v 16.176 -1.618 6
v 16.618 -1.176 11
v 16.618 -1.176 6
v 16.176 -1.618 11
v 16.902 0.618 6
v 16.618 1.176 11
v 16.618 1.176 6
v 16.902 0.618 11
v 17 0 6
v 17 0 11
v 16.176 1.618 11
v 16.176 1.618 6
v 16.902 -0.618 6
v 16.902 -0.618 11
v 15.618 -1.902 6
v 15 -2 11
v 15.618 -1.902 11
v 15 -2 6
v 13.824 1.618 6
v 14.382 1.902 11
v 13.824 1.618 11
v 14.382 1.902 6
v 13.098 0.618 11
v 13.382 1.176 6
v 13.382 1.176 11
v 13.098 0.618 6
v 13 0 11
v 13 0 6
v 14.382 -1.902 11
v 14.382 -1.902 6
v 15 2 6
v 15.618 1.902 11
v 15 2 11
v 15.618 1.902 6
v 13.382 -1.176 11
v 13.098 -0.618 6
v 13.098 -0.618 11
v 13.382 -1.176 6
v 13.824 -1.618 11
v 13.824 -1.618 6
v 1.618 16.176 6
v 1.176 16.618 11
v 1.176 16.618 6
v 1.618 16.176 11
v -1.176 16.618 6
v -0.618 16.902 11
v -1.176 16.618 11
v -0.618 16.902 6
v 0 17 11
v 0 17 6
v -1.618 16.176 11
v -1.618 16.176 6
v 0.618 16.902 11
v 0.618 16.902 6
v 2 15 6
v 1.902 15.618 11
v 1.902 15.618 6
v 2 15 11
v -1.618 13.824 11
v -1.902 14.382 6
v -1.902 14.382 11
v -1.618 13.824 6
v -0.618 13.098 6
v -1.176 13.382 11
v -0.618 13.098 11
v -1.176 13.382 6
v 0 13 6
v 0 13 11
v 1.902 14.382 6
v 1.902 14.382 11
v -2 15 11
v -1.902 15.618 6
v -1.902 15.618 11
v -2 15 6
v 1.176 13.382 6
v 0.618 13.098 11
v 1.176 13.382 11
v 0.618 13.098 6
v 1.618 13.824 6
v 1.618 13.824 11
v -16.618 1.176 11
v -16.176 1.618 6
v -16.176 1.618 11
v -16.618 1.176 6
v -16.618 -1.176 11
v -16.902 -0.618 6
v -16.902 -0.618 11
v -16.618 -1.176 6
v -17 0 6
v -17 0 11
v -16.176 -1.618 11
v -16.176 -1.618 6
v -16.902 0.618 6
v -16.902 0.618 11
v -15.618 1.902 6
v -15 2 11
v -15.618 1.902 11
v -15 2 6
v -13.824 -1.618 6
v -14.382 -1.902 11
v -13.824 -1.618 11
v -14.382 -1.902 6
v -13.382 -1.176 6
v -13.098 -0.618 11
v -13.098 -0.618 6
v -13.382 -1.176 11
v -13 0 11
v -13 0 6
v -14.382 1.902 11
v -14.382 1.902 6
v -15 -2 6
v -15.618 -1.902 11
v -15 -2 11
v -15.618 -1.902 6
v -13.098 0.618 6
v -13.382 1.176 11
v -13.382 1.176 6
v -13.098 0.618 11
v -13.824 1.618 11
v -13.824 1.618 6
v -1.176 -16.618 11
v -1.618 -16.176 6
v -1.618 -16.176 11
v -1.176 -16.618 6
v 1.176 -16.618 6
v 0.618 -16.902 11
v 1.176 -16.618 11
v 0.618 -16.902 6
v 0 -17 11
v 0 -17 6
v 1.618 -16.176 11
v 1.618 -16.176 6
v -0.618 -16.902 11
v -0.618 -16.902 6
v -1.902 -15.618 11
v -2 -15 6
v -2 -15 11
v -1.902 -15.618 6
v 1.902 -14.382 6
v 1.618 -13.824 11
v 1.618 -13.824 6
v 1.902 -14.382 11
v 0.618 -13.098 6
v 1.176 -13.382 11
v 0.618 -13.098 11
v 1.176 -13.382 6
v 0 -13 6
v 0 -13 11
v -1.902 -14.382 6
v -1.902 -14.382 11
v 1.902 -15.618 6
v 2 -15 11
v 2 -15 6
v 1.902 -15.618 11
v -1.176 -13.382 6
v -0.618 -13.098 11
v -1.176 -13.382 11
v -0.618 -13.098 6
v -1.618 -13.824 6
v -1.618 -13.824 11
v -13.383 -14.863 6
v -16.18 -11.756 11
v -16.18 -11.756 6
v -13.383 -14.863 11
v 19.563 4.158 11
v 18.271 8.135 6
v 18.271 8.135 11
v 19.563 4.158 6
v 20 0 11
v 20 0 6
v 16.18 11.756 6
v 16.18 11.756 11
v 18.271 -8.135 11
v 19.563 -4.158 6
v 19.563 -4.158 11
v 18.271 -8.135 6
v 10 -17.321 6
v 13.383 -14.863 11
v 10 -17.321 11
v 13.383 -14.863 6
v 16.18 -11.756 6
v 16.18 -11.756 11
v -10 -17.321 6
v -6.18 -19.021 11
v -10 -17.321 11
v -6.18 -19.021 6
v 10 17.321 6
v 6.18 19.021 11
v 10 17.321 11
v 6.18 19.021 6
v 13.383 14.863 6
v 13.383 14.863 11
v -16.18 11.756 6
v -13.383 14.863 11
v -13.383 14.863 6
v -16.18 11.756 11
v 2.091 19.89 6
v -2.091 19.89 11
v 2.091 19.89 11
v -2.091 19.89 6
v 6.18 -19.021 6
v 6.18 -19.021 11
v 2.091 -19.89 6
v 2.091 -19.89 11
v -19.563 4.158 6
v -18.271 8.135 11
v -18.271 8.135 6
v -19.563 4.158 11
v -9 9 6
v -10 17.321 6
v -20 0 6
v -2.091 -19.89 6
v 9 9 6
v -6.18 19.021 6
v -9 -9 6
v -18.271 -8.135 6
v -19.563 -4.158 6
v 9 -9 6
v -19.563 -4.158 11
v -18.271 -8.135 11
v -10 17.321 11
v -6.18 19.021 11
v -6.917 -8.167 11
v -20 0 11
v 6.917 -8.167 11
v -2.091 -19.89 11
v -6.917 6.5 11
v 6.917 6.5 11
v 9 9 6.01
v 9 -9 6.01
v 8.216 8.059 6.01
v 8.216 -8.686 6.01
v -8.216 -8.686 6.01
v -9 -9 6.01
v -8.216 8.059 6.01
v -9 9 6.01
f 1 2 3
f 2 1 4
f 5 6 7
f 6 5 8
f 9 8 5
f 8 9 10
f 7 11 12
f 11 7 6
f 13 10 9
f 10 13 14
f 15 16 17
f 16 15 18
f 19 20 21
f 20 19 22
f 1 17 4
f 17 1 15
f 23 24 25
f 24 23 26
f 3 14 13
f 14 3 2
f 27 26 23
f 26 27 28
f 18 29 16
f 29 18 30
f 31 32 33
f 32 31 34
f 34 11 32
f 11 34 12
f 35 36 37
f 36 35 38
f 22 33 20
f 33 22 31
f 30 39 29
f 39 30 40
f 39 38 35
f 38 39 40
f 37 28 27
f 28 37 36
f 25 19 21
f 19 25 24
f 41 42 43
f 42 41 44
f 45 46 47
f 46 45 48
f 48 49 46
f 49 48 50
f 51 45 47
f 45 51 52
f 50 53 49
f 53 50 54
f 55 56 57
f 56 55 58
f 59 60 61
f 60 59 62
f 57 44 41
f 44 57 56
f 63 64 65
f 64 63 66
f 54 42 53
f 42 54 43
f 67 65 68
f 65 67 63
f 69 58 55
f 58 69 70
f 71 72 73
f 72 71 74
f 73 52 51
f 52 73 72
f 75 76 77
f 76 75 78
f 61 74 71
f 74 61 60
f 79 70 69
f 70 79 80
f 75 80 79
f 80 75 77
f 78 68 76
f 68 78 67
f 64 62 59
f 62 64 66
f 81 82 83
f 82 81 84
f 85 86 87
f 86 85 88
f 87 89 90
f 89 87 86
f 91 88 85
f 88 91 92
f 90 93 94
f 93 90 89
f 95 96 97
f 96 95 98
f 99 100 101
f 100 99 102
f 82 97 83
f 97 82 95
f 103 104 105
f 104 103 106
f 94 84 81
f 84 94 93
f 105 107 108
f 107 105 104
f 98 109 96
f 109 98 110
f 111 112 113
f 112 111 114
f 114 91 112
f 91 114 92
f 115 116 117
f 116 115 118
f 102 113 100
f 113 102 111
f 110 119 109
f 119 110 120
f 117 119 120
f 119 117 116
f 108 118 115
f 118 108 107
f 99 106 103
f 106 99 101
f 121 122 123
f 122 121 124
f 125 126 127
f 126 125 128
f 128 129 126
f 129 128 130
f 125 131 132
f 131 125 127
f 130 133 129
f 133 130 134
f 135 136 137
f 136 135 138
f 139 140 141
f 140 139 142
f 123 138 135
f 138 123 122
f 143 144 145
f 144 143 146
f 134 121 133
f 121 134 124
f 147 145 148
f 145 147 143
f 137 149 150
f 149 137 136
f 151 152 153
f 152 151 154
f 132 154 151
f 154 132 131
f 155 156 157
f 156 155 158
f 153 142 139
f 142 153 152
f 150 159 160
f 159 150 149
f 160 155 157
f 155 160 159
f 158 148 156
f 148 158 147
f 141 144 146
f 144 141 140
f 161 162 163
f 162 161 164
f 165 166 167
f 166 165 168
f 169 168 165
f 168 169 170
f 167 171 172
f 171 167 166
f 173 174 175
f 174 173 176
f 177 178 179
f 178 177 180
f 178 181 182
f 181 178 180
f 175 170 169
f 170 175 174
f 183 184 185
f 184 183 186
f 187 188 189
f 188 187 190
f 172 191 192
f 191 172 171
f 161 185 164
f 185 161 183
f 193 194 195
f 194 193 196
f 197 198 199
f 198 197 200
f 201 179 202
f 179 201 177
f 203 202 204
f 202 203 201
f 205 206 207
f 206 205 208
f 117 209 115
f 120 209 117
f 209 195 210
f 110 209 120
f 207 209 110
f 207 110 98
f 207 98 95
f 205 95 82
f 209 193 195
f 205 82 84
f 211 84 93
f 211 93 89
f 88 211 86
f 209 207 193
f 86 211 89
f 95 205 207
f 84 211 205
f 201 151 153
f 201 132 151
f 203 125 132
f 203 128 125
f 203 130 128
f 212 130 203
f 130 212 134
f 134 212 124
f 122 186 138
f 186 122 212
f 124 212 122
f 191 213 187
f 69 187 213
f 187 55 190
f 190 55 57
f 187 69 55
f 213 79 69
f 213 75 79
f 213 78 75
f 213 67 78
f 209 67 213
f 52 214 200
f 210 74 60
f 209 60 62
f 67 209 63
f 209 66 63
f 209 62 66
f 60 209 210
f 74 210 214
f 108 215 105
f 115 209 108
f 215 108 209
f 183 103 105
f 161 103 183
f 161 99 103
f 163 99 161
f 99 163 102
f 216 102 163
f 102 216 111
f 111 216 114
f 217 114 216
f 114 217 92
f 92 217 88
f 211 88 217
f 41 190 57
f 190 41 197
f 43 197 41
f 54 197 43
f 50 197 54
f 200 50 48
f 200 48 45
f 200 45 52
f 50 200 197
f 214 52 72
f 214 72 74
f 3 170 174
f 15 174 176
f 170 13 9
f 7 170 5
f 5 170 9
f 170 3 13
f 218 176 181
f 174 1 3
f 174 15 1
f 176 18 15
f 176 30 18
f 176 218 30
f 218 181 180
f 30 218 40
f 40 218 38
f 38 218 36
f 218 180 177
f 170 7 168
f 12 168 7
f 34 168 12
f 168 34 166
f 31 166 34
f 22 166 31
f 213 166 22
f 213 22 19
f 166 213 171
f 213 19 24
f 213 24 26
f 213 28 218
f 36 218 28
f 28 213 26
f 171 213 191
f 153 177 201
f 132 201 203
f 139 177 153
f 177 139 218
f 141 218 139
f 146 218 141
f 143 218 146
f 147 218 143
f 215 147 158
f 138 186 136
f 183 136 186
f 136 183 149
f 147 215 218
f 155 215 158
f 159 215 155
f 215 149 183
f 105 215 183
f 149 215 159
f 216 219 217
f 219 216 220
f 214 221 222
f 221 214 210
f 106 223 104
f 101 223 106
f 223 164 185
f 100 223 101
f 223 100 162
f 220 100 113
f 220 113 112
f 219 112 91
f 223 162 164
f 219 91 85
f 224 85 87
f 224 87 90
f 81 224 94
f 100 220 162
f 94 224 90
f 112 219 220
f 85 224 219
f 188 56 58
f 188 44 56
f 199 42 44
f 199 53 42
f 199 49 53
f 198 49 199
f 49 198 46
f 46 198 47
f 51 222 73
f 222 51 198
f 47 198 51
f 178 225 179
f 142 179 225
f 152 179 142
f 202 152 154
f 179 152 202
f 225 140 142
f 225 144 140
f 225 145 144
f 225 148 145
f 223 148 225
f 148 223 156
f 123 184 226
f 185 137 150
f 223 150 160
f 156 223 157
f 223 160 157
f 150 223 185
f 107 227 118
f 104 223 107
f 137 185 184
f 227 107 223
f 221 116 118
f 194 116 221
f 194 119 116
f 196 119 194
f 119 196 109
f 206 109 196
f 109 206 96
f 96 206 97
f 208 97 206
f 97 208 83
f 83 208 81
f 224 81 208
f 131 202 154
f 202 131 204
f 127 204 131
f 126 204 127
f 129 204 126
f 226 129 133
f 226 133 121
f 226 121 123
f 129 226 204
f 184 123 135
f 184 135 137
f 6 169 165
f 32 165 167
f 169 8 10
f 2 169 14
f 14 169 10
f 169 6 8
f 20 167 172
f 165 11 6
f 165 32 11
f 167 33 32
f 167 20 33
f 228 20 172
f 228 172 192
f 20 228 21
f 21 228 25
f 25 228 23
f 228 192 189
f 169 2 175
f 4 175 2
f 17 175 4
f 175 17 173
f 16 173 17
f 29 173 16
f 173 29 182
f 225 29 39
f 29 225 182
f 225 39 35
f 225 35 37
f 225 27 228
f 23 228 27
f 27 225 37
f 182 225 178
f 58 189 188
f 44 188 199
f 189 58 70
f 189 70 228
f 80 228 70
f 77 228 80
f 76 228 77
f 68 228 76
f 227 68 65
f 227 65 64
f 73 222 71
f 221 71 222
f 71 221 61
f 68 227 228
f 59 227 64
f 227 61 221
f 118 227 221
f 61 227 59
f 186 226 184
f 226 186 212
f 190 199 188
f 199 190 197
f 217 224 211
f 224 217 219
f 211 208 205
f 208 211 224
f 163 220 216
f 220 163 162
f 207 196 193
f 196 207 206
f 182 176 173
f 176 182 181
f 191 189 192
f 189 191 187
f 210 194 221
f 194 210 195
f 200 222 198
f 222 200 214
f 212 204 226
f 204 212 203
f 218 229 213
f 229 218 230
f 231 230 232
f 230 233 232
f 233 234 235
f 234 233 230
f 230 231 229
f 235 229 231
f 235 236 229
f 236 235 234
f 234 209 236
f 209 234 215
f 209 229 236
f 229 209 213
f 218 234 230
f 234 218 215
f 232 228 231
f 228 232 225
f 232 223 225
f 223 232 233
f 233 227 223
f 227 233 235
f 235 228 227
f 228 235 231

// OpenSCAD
coreWidth = 40;
baseHeight = 6;
mountRadius = 2.5;
mountDistance = 20;
mountMargin = 5;
baseDepth = mountDistance + (mountMargin*2);
baseWidth = coreWidth + (mountMargin*4);
baseBuffer = 3;
screwHeight = 7.5;
screwRadius = 2;
nutHeight = 3.5;
nutRadius = 3.9;


normalDimensions = [18,18,13,14,2.5,1,9.6];
module mirror_copy(vector){
    children();
    mirror(vector)
    children();
}

module Base(bottom){
    difference(){
if(bottom){
    union(){
    translate(-[baseWidth, baseDepth,0]/2)
    cube([baseWidth, baseDepth, baseHeight]);
cylinder(baseHeight, d=coreWidth);
}}else{
translate([0,0,baseHeight])
cylinder(screwHeight+nutHeight-baseHeight, d=coreWidth);
}
for(i = [0,90,180,270])
rotate(i, [0,0,1])
translate([coreWidth/2-mountMargin,0,0])
union(){
translate([0,0,-1])
cylinder($fn=6, nutHeight+1,r = nutRadius);
translate([0,0,nutHeight-1])
cylinder($fn=20, screwHeight+2, r = screwRadius);
}
mirror_copy([1,0,0])
mirror_copy([0,1,0])
translate([baseWidth/2 - (mountMargin),mountDistance/2,-1])
cylinder(baseHeight+2,r=mountRadius);
translate([-9,-9,baseHeight/2])
cube([18,18,baseHeight/2+0.01]);
    }
}

module keycap(dimensions){  
width = dimensions[0];
length = dimensions[1];
topWidth = dimensions[2];
topLength = dimensions[3];
xOffset = dimensions[4];
yOffset = dimensions[5];
height = dimensions[6];

CubePoints = [
  [  0,  0,  0 ],  //0
  [ width,  0,  0 ],  //1
  [ width,  length,  0 ],  //2
  [  0,  length,  0 ],  //3
  [  xOffset,  yOffset,  height],  //4
  [ xOffset+topWidth,  yOffset,  height],  //5
  [ xOffset+topWidth,  yOffset+topLength,  height],  //6
  [  xOffset,  yOffset+topLength,  height]]; //7
  
CubeFaces = [
  [0,1,2,3],  // bottom
  [4,5,1,0],  // front
  [7,6,5,4],  // top
  [5,6,2,1],  // right
  [6,7,3,2],  // back
  [7,4,0,3]]; // left
  
translate(-[width, length,0]/2)
polyhedron( CubePoints, CubeFaces );
}
difference(){
Base(false);
translate([0, 0,baseHeight]/2)
keycap(normalDimensions);
}
